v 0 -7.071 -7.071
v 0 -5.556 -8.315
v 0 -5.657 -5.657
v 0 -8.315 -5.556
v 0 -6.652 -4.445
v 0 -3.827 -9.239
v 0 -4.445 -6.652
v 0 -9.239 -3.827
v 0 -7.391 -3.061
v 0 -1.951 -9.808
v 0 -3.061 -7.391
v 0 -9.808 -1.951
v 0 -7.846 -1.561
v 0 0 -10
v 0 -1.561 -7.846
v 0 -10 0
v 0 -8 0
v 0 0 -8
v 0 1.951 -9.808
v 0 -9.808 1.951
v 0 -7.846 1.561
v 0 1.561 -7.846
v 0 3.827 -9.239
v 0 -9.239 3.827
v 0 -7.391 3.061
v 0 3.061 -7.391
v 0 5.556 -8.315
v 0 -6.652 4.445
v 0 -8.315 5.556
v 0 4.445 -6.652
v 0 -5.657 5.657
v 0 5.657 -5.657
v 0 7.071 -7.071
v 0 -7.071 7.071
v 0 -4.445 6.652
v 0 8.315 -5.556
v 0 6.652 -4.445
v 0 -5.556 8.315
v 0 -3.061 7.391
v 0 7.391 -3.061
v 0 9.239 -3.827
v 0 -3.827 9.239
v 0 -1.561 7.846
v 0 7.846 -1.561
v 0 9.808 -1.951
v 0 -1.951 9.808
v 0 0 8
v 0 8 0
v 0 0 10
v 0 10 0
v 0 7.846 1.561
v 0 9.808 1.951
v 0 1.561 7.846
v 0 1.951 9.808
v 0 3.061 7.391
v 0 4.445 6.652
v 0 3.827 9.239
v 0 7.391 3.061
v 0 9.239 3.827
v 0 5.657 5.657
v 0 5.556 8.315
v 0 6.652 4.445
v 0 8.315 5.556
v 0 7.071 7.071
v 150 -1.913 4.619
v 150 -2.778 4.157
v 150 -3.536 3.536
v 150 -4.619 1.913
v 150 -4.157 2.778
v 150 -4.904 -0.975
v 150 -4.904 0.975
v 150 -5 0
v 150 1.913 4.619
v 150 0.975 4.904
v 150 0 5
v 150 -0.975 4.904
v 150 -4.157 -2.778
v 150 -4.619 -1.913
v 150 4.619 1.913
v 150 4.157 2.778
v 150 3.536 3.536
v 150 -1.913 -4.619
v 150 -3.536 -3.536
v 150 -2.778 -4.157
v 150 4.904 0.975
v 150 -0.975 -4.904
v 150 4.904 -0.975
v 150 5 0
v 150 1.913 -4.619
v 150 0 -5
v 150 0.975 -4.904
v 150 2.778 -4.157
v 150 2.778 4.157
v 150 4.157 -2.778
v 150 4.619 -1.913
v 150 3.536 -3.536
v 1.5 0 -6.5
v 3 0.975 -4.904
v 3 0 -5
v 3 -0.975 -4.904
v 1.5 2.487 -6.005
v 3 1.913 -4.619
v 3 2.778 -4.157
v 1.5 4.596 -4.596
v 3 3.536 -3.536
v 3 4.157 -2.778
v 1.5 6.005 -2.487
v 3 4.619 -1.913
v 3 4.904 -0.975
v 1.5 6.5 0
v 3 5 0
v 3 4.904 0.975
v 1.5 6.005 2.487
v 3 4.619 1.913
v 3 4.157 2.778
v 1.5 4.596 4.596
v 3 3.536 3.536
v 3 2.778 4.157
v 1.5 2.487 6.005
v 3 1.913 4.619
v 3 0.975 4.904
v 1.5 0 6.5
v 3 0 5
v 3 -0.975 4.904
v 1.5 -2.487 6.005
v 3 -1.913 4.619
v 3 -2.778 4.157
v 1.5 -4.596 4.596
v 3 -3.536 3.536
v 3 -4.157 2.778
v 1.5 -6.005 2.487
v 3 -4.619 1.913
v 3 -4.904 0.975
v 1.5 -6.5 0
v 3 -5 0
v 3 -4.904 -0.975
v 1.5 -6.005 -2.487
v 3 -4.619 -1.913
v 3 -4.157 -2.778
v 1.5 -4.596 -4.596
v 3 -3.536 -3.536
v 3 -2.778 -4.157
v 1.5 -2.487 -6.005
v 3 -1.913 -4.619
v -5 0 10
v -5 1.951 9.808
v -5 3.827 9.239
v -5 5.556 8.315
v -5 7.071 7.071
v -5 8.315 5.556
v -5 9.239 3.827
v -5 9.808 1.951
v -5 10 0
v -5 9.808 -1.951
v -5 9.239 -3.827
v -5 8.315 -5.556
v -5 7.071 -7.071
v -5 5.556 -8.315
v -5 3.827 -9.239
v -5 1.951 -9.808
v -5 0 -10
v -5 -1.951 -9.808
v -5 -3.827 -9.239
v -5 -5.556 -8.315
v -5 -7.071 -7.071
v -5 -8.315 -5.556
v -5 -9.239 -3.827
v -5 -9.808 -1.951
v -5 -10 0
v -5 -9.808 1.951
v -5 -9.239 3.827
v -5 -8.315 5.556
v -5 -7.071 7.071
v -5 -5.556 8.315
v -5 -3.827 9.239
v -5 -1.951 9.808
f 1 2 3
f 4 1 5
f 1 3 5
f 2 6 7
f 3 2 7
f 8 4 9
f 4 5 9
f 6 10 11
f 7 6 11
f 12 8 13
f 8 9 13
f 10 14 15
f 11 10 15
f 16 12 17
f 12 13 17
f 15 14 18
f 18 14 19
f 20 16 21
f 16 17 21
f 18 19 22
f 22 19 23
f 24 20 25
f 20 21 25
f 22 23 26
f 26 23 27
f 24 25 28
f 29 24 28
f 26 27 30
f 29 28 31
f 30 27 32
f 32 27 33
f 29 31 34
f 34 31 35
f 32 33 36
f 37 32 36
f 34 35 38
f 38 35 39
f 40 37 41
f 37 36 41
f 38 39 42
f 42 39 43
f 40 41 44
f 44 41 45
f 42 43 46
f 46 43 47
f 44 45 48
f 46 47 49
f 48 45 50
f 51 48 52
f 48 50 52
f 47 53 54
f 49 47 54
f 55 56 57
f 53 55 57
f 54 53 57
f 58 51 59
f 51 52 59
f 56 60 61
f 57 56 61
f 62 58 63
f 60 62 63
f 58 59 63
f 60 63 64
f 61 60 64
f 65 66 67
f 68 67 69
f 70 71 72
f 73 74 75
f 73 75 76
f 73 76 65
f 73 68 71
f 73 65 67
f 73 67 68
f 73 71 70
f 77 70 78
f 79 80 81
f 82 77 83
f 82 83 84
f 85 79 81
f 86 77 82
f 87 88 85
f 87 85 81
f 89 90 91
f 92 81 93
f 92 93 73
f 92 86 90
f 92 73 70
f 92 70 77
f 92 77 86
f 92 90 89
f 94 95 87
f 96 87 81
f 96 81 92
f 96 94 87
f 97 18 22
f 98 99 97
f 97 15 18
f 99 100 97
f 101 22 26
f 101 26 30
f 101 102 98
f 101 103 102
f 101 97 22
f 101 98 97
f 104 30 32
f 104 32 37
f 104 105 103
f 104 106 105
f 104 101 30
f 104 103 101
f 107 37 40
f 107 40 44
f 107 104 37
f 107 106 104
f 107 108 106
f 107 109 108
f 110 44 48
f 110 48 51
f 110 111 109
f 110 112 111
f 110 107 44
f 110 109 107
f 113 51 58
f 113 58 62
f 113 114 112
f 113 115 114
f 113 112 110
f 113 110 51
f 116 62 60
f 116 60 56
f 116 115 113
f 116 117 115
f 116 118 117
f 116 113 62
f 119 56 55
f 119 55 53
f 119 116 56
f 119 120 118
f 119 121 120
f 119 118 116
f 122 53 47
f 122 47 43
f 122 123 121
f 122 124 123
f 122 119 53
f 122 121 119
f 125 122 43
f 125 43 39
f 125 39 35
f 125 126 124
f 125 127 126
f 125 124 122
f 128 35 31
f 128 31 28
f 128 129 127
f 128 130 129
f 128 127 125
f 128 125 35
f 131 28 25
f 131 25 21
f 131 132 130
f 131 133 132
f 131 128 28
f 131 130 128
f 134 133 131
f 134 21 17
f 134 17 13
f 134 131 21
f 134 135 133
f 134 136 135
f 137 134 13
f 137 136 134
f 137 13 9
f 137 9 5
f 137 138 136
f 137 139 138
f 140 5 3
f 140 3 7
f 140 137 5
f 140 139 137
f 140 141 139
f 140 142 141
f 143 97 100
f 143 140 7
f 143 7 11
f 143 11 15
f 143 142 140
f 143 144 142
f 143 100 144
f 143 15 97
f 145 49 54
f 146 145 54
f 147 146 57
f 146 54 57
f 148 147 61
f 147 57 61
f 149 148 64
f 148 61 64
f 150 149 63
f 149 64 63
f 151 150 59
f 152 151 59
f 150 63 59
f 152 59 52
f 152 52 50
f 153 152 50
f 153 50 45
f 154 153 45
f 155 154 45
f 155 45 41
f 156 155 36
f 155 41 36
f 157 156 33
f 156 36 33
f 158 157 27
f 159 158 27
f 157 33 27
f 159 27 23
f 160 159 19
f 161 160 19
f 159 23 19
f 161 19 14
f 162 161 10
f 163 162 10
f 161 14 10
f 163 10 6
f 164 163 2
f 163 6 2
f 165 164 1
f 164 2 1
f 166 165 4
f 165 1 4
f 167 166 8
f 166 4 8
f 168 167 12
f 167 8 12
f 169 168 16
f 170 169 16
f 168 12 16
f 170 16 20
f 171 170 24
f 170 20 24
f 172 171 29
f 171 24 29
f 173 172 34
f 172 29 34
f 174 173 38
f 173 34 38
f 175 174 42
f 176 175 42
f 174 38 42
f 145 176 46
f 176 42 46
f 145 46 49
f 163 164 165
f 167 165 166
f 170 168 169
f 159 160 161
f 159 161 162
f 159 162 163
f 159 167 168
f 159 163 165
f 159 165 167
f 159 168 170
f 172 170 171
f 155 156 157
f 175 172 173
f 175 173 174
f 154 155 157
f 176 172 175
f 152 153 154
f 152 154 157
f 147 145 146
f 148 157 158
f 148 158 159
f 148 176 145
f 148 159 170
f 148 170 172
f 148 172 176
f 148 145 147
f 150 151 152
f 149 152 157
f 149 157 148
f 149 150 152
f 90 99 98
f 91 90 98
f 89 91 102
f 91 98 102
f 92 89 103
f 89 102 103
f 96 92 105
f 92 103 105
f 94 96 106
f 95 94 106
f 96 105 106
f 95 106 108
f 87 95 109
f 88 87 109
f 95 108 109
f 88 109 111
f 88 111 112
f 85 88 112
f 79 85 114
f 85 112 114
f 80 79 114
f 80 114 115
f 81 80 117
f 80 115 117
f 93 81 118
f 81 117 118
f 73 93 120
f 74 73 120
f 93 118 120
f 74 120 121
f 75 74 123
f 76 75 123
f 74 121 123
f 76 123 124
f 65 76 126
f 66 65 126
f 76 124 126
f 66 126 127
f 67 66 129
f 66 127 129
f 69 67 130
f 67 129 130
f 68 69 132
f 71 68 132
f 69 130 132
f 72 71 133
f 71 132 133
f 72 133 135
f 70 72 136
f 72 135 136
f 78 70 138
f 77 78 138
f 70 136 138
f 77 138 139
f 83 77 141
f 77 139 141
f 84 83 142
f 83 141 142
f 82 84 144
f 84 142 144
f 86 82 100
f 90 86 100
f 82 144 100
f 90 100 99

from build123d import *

# Parameters (mm, degrees)
SKETCH_1_R      = 5
EXTRUDE_1_DEPTH = 150
SKETCH_2_R      = 10
EXTRUDE_2_DEPTH = 5
CHAMFER_1_SIZE  = 3


with BuildPart() as part:
    # 草图1 → 凸台-拉伸1 (new body)
    with BuildSketch(Plane(origin=(0, 0, 0), x_dir=(0, 0, -1), z_dir=(1, 0, 0))):
        Circle(SKETCH_1_R)
    extrude(amount=EXTRUDE_1_DEPTH)

    # 草图2 → 凸台-拉伸2 (add)
    with BuildSketch(Plane.ZY):
        Circle(SKETCH_2_R)
    extrude(amount=EXTRUDE_2_DEPTH)

    # 倒角1
    chamfer_1_edges = [part.edges().sort_by_distance(p)[0] for p in [
        (0, 0, 5),
    ]]
    chamfer(chamfer_1_edges, length=CHAMFER_1_SIZE)


solid = part.part
